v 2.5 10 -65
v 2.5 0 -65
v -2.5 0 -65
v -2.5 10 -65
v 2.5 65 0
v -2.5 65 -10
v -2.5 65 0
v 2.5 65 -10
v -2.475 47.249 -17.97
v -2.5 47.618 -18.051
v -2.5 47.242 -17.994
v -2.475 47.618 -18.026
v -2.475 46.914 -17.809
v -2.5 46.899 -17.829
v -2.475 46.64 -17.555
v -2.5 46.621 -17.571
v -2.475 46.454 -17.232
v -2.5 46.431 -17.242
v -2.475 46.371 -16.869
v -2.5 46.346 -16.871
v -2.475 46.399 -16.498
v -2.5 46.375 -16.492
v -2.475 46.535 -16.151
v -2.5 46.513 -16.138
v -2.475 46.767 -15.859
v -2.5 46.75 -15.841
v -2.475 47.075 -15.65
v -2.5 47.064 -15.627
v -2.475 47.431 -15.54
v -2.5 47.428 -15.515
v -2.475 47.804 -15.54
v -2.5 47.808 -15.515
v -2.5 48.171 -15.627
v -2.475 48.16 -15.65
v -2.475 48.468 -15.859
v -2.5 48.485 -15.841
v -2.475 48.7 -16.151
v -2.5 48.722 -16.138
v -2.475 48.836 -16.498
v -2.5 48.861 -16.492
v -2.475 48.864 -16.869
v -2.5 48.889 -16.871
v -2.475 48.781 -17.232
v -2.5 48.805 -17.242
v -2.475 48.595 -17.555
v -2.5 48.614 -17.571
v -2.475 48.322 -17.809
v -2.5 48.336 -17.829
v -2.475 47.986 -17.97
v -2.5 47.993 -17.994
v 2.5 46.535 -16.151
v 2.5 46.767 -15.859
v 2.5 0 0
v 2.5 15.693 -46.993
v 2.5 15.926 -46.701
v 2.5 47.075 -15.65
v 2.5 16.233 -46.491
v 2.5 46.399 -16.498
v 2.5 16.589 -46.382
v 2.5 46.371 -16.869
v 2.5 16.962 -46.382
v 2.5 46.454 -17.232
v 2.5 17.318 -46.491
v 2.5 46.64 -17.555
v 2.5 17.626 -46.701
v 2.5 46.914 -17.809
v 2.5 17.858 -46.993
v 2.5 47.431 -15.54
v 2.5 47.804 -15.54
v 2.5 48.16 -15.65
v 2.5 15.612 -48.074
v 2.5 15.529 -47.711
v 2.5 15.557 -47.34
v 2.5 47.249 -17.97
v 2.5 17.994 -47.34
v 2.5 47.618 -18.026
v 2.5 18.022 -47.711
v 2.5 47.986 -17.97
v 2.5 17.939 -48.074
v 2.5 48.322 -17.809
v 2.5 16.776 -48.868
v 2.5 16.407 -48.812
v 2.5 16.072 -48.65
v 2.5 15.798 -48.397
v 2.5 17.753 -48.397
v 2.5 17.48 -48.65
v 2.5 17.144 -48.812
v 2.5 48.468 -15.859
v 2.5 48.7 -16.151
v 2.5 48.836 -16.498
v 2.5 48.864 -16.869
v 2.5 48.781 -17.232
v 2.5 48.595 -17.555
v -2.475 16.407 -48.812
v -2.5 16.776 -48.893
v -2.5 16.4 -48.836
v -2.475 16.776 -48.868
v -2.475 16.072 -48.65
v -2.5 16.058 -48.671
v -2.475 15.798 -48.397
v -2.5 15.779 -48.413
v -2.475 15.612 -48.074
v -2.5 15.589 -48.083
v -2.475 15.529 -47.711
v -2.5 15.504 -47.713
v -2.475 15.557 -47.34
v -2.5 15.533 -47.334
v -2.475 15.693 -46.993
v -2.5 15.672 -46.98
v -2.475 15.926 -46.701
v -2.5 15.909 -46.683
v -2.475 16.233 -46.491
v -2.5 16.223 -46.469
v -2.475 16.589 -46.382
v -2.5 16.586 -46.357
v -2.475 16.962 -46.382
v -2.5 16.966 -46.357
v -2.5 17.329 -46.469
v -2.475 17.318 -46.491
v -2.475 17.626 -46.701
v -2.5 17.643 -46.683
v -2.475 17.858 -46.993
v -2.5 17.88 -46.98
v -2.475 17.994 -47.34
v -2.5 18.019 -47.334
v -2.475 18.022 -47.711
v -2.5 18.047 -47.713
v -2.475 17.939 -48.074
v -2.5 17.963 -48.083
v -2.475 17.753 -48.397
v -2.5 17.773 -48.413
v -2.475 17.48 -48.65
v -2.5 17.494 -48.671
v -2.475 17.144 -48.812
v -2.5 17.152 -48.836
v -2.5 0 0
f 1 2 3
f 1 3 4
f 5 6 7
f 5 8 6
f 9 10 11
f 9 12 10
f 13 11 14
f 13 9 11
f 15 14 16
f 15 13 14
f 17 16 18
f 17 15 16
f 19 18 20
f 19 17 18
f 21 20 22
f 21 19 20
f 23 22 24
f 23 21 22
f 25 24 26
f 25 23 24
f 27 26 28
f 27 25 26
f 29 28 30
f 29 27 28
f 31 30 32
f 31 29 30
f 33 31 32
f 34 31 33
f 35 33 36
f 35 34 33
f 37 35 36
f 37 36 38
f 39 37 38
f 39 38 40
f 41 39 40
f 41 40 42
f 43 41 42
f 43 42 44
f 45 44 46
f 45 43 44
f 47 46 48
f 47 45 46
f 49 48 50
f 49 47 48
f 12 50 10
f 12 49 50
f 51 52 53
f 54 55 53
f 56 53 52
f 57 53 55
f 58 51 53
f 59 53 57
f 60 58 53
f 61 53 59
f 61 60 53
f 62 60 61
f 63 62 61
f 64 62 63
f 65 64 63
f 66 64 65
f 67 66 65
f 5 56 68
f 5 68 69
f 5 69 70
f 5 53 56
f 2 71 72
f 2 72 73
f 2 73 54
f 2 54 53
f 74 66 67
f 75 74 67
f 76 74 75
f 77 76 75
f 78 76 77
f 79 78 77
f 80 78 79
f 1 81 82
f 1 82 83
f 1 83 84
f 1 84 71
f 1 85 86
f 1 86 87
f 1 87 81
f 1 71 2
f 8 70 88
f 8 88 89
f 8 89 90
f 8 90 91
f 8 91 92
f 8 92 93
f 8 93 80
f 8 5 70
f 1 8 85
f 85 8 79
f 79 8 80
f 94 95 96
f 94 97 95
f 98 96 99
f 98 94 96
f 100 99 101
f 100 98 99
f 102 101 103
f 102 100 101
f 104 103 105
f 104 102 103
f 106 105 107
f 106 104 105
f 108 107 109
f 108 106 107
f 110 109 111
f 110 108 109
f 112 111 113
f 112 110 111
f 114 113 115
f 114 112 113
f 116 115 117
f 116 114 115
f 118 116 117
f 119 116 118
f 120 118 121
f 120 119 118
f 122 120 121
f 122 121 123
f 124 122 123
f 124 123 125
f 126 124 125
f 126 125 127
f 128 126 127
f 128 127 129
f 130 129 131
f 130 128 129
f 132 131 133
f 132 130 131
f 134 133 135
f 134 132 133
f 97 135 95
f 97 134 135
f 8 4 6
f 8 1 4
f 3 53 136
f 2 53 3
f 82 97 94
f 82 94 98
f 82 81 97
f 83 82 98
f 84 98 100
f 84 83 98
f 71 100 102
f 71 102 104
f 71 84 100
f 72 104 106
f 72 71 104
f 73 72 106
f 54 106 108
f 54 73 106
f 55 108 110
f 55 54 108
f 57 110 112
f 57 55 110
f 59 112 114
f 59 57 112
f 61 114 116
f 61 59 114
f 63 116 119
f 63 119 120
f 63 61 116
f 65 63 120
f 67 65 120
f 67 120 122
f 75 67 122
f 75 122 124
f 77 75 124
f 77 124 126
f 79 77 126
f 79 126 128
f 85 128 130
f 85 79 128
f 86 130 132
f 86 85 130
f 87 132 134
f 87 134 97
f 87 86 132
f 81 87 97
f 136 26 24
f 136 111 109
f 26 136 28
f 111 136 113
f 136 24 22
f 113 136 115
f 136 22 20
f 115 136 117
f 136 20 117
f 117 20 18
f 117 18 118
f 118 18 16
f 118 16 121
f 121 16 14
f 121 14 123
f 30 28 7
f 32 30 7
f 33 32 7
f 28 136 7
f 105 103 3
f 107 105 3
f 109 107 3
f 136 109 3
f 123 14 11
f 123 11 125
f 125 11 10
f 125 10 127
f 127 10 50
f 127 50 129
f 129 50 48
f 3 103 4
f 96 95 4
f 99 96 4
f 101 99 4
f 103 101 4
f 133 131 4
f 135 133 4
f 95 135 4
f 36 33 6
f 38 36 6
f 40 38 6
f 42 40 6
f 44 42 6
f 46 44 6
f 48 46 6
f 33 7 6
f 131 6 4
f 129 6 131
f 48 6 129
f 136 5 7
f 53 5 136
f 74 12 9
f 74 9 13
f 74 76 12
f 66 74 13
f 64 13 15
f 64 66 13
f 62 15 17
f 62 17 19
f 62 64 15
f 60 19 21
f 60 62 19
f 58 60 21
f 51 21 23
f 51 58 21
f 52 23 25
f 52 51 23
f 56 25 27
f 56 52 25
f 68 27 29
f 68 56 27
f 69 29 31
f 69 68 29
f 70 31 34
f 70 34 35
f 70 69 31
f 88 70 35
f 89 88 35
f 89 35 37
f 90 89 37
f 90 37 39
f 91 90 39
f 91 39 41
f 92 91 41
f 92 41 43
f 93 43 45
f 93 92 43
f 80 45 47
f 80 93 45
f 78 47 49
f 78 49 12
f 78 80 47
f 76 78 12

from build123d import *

# Parameters (mm, degrees)
BOSS_EXTRUDE1_DEPTH            = 2.5
F_2_5MM_DOWEL_HOLE1_AT_2_COUNT = 2
F_2_5MM_DOWEL_HOLE1_AT_2_PITCH = 43.617065155


with BuildPart() as part:
    # Sketch1 → Boss-Extrude1 (new, symmetric)
    with BuildSketch(Plane(origin=(0, 0, 0), x_dir=(0, 0, -1), z_dir=(1, 0, 0))):
        Polygon((0, 65), (0, 0), (65, 0), (65, 10), (10, 65), align=None)
    extrude(amount=BOSS_EXTRUDE1_DEPTH, both=True)

    # Sketch3 → Ø2.5mm Dowel Hole1 (revolve, cut)
    with BuildSketch(Plane(origin=(2.5, 47.617660414, -16.775737868), x_dir=(0, 0, -1), z_dir=(0, 1, 0))):
        Polygon((0, 0), (0, 5), (1.275, 5), (1.25, 4.975), (1.25, 0), align=None)
    f_2_5mm_dowel_hole1 = revolve(axis=Axis((8.85, 47.617660414, -16.775737868), (-1, 0, 0)), mode=Mode.SUBTRACT)

    # Ø2.5mm Dowel Hole1 at 2: Ø2.5mm Dowel Hole1 ×2
    with Locations(*[Vector(0, -0.7071067811865474, -0.7071067811865477) * (i * F_2_5MM_DOWEL_HOLE1_AT_2_PITCH) for i in range(1, F_2_5MM_DOWEL_HOLE1_AT_2_COUNT)]):
        add(f_2_5mm_dowel_hole1, mode=Mode.SUBTRACT)


solid = part.part
